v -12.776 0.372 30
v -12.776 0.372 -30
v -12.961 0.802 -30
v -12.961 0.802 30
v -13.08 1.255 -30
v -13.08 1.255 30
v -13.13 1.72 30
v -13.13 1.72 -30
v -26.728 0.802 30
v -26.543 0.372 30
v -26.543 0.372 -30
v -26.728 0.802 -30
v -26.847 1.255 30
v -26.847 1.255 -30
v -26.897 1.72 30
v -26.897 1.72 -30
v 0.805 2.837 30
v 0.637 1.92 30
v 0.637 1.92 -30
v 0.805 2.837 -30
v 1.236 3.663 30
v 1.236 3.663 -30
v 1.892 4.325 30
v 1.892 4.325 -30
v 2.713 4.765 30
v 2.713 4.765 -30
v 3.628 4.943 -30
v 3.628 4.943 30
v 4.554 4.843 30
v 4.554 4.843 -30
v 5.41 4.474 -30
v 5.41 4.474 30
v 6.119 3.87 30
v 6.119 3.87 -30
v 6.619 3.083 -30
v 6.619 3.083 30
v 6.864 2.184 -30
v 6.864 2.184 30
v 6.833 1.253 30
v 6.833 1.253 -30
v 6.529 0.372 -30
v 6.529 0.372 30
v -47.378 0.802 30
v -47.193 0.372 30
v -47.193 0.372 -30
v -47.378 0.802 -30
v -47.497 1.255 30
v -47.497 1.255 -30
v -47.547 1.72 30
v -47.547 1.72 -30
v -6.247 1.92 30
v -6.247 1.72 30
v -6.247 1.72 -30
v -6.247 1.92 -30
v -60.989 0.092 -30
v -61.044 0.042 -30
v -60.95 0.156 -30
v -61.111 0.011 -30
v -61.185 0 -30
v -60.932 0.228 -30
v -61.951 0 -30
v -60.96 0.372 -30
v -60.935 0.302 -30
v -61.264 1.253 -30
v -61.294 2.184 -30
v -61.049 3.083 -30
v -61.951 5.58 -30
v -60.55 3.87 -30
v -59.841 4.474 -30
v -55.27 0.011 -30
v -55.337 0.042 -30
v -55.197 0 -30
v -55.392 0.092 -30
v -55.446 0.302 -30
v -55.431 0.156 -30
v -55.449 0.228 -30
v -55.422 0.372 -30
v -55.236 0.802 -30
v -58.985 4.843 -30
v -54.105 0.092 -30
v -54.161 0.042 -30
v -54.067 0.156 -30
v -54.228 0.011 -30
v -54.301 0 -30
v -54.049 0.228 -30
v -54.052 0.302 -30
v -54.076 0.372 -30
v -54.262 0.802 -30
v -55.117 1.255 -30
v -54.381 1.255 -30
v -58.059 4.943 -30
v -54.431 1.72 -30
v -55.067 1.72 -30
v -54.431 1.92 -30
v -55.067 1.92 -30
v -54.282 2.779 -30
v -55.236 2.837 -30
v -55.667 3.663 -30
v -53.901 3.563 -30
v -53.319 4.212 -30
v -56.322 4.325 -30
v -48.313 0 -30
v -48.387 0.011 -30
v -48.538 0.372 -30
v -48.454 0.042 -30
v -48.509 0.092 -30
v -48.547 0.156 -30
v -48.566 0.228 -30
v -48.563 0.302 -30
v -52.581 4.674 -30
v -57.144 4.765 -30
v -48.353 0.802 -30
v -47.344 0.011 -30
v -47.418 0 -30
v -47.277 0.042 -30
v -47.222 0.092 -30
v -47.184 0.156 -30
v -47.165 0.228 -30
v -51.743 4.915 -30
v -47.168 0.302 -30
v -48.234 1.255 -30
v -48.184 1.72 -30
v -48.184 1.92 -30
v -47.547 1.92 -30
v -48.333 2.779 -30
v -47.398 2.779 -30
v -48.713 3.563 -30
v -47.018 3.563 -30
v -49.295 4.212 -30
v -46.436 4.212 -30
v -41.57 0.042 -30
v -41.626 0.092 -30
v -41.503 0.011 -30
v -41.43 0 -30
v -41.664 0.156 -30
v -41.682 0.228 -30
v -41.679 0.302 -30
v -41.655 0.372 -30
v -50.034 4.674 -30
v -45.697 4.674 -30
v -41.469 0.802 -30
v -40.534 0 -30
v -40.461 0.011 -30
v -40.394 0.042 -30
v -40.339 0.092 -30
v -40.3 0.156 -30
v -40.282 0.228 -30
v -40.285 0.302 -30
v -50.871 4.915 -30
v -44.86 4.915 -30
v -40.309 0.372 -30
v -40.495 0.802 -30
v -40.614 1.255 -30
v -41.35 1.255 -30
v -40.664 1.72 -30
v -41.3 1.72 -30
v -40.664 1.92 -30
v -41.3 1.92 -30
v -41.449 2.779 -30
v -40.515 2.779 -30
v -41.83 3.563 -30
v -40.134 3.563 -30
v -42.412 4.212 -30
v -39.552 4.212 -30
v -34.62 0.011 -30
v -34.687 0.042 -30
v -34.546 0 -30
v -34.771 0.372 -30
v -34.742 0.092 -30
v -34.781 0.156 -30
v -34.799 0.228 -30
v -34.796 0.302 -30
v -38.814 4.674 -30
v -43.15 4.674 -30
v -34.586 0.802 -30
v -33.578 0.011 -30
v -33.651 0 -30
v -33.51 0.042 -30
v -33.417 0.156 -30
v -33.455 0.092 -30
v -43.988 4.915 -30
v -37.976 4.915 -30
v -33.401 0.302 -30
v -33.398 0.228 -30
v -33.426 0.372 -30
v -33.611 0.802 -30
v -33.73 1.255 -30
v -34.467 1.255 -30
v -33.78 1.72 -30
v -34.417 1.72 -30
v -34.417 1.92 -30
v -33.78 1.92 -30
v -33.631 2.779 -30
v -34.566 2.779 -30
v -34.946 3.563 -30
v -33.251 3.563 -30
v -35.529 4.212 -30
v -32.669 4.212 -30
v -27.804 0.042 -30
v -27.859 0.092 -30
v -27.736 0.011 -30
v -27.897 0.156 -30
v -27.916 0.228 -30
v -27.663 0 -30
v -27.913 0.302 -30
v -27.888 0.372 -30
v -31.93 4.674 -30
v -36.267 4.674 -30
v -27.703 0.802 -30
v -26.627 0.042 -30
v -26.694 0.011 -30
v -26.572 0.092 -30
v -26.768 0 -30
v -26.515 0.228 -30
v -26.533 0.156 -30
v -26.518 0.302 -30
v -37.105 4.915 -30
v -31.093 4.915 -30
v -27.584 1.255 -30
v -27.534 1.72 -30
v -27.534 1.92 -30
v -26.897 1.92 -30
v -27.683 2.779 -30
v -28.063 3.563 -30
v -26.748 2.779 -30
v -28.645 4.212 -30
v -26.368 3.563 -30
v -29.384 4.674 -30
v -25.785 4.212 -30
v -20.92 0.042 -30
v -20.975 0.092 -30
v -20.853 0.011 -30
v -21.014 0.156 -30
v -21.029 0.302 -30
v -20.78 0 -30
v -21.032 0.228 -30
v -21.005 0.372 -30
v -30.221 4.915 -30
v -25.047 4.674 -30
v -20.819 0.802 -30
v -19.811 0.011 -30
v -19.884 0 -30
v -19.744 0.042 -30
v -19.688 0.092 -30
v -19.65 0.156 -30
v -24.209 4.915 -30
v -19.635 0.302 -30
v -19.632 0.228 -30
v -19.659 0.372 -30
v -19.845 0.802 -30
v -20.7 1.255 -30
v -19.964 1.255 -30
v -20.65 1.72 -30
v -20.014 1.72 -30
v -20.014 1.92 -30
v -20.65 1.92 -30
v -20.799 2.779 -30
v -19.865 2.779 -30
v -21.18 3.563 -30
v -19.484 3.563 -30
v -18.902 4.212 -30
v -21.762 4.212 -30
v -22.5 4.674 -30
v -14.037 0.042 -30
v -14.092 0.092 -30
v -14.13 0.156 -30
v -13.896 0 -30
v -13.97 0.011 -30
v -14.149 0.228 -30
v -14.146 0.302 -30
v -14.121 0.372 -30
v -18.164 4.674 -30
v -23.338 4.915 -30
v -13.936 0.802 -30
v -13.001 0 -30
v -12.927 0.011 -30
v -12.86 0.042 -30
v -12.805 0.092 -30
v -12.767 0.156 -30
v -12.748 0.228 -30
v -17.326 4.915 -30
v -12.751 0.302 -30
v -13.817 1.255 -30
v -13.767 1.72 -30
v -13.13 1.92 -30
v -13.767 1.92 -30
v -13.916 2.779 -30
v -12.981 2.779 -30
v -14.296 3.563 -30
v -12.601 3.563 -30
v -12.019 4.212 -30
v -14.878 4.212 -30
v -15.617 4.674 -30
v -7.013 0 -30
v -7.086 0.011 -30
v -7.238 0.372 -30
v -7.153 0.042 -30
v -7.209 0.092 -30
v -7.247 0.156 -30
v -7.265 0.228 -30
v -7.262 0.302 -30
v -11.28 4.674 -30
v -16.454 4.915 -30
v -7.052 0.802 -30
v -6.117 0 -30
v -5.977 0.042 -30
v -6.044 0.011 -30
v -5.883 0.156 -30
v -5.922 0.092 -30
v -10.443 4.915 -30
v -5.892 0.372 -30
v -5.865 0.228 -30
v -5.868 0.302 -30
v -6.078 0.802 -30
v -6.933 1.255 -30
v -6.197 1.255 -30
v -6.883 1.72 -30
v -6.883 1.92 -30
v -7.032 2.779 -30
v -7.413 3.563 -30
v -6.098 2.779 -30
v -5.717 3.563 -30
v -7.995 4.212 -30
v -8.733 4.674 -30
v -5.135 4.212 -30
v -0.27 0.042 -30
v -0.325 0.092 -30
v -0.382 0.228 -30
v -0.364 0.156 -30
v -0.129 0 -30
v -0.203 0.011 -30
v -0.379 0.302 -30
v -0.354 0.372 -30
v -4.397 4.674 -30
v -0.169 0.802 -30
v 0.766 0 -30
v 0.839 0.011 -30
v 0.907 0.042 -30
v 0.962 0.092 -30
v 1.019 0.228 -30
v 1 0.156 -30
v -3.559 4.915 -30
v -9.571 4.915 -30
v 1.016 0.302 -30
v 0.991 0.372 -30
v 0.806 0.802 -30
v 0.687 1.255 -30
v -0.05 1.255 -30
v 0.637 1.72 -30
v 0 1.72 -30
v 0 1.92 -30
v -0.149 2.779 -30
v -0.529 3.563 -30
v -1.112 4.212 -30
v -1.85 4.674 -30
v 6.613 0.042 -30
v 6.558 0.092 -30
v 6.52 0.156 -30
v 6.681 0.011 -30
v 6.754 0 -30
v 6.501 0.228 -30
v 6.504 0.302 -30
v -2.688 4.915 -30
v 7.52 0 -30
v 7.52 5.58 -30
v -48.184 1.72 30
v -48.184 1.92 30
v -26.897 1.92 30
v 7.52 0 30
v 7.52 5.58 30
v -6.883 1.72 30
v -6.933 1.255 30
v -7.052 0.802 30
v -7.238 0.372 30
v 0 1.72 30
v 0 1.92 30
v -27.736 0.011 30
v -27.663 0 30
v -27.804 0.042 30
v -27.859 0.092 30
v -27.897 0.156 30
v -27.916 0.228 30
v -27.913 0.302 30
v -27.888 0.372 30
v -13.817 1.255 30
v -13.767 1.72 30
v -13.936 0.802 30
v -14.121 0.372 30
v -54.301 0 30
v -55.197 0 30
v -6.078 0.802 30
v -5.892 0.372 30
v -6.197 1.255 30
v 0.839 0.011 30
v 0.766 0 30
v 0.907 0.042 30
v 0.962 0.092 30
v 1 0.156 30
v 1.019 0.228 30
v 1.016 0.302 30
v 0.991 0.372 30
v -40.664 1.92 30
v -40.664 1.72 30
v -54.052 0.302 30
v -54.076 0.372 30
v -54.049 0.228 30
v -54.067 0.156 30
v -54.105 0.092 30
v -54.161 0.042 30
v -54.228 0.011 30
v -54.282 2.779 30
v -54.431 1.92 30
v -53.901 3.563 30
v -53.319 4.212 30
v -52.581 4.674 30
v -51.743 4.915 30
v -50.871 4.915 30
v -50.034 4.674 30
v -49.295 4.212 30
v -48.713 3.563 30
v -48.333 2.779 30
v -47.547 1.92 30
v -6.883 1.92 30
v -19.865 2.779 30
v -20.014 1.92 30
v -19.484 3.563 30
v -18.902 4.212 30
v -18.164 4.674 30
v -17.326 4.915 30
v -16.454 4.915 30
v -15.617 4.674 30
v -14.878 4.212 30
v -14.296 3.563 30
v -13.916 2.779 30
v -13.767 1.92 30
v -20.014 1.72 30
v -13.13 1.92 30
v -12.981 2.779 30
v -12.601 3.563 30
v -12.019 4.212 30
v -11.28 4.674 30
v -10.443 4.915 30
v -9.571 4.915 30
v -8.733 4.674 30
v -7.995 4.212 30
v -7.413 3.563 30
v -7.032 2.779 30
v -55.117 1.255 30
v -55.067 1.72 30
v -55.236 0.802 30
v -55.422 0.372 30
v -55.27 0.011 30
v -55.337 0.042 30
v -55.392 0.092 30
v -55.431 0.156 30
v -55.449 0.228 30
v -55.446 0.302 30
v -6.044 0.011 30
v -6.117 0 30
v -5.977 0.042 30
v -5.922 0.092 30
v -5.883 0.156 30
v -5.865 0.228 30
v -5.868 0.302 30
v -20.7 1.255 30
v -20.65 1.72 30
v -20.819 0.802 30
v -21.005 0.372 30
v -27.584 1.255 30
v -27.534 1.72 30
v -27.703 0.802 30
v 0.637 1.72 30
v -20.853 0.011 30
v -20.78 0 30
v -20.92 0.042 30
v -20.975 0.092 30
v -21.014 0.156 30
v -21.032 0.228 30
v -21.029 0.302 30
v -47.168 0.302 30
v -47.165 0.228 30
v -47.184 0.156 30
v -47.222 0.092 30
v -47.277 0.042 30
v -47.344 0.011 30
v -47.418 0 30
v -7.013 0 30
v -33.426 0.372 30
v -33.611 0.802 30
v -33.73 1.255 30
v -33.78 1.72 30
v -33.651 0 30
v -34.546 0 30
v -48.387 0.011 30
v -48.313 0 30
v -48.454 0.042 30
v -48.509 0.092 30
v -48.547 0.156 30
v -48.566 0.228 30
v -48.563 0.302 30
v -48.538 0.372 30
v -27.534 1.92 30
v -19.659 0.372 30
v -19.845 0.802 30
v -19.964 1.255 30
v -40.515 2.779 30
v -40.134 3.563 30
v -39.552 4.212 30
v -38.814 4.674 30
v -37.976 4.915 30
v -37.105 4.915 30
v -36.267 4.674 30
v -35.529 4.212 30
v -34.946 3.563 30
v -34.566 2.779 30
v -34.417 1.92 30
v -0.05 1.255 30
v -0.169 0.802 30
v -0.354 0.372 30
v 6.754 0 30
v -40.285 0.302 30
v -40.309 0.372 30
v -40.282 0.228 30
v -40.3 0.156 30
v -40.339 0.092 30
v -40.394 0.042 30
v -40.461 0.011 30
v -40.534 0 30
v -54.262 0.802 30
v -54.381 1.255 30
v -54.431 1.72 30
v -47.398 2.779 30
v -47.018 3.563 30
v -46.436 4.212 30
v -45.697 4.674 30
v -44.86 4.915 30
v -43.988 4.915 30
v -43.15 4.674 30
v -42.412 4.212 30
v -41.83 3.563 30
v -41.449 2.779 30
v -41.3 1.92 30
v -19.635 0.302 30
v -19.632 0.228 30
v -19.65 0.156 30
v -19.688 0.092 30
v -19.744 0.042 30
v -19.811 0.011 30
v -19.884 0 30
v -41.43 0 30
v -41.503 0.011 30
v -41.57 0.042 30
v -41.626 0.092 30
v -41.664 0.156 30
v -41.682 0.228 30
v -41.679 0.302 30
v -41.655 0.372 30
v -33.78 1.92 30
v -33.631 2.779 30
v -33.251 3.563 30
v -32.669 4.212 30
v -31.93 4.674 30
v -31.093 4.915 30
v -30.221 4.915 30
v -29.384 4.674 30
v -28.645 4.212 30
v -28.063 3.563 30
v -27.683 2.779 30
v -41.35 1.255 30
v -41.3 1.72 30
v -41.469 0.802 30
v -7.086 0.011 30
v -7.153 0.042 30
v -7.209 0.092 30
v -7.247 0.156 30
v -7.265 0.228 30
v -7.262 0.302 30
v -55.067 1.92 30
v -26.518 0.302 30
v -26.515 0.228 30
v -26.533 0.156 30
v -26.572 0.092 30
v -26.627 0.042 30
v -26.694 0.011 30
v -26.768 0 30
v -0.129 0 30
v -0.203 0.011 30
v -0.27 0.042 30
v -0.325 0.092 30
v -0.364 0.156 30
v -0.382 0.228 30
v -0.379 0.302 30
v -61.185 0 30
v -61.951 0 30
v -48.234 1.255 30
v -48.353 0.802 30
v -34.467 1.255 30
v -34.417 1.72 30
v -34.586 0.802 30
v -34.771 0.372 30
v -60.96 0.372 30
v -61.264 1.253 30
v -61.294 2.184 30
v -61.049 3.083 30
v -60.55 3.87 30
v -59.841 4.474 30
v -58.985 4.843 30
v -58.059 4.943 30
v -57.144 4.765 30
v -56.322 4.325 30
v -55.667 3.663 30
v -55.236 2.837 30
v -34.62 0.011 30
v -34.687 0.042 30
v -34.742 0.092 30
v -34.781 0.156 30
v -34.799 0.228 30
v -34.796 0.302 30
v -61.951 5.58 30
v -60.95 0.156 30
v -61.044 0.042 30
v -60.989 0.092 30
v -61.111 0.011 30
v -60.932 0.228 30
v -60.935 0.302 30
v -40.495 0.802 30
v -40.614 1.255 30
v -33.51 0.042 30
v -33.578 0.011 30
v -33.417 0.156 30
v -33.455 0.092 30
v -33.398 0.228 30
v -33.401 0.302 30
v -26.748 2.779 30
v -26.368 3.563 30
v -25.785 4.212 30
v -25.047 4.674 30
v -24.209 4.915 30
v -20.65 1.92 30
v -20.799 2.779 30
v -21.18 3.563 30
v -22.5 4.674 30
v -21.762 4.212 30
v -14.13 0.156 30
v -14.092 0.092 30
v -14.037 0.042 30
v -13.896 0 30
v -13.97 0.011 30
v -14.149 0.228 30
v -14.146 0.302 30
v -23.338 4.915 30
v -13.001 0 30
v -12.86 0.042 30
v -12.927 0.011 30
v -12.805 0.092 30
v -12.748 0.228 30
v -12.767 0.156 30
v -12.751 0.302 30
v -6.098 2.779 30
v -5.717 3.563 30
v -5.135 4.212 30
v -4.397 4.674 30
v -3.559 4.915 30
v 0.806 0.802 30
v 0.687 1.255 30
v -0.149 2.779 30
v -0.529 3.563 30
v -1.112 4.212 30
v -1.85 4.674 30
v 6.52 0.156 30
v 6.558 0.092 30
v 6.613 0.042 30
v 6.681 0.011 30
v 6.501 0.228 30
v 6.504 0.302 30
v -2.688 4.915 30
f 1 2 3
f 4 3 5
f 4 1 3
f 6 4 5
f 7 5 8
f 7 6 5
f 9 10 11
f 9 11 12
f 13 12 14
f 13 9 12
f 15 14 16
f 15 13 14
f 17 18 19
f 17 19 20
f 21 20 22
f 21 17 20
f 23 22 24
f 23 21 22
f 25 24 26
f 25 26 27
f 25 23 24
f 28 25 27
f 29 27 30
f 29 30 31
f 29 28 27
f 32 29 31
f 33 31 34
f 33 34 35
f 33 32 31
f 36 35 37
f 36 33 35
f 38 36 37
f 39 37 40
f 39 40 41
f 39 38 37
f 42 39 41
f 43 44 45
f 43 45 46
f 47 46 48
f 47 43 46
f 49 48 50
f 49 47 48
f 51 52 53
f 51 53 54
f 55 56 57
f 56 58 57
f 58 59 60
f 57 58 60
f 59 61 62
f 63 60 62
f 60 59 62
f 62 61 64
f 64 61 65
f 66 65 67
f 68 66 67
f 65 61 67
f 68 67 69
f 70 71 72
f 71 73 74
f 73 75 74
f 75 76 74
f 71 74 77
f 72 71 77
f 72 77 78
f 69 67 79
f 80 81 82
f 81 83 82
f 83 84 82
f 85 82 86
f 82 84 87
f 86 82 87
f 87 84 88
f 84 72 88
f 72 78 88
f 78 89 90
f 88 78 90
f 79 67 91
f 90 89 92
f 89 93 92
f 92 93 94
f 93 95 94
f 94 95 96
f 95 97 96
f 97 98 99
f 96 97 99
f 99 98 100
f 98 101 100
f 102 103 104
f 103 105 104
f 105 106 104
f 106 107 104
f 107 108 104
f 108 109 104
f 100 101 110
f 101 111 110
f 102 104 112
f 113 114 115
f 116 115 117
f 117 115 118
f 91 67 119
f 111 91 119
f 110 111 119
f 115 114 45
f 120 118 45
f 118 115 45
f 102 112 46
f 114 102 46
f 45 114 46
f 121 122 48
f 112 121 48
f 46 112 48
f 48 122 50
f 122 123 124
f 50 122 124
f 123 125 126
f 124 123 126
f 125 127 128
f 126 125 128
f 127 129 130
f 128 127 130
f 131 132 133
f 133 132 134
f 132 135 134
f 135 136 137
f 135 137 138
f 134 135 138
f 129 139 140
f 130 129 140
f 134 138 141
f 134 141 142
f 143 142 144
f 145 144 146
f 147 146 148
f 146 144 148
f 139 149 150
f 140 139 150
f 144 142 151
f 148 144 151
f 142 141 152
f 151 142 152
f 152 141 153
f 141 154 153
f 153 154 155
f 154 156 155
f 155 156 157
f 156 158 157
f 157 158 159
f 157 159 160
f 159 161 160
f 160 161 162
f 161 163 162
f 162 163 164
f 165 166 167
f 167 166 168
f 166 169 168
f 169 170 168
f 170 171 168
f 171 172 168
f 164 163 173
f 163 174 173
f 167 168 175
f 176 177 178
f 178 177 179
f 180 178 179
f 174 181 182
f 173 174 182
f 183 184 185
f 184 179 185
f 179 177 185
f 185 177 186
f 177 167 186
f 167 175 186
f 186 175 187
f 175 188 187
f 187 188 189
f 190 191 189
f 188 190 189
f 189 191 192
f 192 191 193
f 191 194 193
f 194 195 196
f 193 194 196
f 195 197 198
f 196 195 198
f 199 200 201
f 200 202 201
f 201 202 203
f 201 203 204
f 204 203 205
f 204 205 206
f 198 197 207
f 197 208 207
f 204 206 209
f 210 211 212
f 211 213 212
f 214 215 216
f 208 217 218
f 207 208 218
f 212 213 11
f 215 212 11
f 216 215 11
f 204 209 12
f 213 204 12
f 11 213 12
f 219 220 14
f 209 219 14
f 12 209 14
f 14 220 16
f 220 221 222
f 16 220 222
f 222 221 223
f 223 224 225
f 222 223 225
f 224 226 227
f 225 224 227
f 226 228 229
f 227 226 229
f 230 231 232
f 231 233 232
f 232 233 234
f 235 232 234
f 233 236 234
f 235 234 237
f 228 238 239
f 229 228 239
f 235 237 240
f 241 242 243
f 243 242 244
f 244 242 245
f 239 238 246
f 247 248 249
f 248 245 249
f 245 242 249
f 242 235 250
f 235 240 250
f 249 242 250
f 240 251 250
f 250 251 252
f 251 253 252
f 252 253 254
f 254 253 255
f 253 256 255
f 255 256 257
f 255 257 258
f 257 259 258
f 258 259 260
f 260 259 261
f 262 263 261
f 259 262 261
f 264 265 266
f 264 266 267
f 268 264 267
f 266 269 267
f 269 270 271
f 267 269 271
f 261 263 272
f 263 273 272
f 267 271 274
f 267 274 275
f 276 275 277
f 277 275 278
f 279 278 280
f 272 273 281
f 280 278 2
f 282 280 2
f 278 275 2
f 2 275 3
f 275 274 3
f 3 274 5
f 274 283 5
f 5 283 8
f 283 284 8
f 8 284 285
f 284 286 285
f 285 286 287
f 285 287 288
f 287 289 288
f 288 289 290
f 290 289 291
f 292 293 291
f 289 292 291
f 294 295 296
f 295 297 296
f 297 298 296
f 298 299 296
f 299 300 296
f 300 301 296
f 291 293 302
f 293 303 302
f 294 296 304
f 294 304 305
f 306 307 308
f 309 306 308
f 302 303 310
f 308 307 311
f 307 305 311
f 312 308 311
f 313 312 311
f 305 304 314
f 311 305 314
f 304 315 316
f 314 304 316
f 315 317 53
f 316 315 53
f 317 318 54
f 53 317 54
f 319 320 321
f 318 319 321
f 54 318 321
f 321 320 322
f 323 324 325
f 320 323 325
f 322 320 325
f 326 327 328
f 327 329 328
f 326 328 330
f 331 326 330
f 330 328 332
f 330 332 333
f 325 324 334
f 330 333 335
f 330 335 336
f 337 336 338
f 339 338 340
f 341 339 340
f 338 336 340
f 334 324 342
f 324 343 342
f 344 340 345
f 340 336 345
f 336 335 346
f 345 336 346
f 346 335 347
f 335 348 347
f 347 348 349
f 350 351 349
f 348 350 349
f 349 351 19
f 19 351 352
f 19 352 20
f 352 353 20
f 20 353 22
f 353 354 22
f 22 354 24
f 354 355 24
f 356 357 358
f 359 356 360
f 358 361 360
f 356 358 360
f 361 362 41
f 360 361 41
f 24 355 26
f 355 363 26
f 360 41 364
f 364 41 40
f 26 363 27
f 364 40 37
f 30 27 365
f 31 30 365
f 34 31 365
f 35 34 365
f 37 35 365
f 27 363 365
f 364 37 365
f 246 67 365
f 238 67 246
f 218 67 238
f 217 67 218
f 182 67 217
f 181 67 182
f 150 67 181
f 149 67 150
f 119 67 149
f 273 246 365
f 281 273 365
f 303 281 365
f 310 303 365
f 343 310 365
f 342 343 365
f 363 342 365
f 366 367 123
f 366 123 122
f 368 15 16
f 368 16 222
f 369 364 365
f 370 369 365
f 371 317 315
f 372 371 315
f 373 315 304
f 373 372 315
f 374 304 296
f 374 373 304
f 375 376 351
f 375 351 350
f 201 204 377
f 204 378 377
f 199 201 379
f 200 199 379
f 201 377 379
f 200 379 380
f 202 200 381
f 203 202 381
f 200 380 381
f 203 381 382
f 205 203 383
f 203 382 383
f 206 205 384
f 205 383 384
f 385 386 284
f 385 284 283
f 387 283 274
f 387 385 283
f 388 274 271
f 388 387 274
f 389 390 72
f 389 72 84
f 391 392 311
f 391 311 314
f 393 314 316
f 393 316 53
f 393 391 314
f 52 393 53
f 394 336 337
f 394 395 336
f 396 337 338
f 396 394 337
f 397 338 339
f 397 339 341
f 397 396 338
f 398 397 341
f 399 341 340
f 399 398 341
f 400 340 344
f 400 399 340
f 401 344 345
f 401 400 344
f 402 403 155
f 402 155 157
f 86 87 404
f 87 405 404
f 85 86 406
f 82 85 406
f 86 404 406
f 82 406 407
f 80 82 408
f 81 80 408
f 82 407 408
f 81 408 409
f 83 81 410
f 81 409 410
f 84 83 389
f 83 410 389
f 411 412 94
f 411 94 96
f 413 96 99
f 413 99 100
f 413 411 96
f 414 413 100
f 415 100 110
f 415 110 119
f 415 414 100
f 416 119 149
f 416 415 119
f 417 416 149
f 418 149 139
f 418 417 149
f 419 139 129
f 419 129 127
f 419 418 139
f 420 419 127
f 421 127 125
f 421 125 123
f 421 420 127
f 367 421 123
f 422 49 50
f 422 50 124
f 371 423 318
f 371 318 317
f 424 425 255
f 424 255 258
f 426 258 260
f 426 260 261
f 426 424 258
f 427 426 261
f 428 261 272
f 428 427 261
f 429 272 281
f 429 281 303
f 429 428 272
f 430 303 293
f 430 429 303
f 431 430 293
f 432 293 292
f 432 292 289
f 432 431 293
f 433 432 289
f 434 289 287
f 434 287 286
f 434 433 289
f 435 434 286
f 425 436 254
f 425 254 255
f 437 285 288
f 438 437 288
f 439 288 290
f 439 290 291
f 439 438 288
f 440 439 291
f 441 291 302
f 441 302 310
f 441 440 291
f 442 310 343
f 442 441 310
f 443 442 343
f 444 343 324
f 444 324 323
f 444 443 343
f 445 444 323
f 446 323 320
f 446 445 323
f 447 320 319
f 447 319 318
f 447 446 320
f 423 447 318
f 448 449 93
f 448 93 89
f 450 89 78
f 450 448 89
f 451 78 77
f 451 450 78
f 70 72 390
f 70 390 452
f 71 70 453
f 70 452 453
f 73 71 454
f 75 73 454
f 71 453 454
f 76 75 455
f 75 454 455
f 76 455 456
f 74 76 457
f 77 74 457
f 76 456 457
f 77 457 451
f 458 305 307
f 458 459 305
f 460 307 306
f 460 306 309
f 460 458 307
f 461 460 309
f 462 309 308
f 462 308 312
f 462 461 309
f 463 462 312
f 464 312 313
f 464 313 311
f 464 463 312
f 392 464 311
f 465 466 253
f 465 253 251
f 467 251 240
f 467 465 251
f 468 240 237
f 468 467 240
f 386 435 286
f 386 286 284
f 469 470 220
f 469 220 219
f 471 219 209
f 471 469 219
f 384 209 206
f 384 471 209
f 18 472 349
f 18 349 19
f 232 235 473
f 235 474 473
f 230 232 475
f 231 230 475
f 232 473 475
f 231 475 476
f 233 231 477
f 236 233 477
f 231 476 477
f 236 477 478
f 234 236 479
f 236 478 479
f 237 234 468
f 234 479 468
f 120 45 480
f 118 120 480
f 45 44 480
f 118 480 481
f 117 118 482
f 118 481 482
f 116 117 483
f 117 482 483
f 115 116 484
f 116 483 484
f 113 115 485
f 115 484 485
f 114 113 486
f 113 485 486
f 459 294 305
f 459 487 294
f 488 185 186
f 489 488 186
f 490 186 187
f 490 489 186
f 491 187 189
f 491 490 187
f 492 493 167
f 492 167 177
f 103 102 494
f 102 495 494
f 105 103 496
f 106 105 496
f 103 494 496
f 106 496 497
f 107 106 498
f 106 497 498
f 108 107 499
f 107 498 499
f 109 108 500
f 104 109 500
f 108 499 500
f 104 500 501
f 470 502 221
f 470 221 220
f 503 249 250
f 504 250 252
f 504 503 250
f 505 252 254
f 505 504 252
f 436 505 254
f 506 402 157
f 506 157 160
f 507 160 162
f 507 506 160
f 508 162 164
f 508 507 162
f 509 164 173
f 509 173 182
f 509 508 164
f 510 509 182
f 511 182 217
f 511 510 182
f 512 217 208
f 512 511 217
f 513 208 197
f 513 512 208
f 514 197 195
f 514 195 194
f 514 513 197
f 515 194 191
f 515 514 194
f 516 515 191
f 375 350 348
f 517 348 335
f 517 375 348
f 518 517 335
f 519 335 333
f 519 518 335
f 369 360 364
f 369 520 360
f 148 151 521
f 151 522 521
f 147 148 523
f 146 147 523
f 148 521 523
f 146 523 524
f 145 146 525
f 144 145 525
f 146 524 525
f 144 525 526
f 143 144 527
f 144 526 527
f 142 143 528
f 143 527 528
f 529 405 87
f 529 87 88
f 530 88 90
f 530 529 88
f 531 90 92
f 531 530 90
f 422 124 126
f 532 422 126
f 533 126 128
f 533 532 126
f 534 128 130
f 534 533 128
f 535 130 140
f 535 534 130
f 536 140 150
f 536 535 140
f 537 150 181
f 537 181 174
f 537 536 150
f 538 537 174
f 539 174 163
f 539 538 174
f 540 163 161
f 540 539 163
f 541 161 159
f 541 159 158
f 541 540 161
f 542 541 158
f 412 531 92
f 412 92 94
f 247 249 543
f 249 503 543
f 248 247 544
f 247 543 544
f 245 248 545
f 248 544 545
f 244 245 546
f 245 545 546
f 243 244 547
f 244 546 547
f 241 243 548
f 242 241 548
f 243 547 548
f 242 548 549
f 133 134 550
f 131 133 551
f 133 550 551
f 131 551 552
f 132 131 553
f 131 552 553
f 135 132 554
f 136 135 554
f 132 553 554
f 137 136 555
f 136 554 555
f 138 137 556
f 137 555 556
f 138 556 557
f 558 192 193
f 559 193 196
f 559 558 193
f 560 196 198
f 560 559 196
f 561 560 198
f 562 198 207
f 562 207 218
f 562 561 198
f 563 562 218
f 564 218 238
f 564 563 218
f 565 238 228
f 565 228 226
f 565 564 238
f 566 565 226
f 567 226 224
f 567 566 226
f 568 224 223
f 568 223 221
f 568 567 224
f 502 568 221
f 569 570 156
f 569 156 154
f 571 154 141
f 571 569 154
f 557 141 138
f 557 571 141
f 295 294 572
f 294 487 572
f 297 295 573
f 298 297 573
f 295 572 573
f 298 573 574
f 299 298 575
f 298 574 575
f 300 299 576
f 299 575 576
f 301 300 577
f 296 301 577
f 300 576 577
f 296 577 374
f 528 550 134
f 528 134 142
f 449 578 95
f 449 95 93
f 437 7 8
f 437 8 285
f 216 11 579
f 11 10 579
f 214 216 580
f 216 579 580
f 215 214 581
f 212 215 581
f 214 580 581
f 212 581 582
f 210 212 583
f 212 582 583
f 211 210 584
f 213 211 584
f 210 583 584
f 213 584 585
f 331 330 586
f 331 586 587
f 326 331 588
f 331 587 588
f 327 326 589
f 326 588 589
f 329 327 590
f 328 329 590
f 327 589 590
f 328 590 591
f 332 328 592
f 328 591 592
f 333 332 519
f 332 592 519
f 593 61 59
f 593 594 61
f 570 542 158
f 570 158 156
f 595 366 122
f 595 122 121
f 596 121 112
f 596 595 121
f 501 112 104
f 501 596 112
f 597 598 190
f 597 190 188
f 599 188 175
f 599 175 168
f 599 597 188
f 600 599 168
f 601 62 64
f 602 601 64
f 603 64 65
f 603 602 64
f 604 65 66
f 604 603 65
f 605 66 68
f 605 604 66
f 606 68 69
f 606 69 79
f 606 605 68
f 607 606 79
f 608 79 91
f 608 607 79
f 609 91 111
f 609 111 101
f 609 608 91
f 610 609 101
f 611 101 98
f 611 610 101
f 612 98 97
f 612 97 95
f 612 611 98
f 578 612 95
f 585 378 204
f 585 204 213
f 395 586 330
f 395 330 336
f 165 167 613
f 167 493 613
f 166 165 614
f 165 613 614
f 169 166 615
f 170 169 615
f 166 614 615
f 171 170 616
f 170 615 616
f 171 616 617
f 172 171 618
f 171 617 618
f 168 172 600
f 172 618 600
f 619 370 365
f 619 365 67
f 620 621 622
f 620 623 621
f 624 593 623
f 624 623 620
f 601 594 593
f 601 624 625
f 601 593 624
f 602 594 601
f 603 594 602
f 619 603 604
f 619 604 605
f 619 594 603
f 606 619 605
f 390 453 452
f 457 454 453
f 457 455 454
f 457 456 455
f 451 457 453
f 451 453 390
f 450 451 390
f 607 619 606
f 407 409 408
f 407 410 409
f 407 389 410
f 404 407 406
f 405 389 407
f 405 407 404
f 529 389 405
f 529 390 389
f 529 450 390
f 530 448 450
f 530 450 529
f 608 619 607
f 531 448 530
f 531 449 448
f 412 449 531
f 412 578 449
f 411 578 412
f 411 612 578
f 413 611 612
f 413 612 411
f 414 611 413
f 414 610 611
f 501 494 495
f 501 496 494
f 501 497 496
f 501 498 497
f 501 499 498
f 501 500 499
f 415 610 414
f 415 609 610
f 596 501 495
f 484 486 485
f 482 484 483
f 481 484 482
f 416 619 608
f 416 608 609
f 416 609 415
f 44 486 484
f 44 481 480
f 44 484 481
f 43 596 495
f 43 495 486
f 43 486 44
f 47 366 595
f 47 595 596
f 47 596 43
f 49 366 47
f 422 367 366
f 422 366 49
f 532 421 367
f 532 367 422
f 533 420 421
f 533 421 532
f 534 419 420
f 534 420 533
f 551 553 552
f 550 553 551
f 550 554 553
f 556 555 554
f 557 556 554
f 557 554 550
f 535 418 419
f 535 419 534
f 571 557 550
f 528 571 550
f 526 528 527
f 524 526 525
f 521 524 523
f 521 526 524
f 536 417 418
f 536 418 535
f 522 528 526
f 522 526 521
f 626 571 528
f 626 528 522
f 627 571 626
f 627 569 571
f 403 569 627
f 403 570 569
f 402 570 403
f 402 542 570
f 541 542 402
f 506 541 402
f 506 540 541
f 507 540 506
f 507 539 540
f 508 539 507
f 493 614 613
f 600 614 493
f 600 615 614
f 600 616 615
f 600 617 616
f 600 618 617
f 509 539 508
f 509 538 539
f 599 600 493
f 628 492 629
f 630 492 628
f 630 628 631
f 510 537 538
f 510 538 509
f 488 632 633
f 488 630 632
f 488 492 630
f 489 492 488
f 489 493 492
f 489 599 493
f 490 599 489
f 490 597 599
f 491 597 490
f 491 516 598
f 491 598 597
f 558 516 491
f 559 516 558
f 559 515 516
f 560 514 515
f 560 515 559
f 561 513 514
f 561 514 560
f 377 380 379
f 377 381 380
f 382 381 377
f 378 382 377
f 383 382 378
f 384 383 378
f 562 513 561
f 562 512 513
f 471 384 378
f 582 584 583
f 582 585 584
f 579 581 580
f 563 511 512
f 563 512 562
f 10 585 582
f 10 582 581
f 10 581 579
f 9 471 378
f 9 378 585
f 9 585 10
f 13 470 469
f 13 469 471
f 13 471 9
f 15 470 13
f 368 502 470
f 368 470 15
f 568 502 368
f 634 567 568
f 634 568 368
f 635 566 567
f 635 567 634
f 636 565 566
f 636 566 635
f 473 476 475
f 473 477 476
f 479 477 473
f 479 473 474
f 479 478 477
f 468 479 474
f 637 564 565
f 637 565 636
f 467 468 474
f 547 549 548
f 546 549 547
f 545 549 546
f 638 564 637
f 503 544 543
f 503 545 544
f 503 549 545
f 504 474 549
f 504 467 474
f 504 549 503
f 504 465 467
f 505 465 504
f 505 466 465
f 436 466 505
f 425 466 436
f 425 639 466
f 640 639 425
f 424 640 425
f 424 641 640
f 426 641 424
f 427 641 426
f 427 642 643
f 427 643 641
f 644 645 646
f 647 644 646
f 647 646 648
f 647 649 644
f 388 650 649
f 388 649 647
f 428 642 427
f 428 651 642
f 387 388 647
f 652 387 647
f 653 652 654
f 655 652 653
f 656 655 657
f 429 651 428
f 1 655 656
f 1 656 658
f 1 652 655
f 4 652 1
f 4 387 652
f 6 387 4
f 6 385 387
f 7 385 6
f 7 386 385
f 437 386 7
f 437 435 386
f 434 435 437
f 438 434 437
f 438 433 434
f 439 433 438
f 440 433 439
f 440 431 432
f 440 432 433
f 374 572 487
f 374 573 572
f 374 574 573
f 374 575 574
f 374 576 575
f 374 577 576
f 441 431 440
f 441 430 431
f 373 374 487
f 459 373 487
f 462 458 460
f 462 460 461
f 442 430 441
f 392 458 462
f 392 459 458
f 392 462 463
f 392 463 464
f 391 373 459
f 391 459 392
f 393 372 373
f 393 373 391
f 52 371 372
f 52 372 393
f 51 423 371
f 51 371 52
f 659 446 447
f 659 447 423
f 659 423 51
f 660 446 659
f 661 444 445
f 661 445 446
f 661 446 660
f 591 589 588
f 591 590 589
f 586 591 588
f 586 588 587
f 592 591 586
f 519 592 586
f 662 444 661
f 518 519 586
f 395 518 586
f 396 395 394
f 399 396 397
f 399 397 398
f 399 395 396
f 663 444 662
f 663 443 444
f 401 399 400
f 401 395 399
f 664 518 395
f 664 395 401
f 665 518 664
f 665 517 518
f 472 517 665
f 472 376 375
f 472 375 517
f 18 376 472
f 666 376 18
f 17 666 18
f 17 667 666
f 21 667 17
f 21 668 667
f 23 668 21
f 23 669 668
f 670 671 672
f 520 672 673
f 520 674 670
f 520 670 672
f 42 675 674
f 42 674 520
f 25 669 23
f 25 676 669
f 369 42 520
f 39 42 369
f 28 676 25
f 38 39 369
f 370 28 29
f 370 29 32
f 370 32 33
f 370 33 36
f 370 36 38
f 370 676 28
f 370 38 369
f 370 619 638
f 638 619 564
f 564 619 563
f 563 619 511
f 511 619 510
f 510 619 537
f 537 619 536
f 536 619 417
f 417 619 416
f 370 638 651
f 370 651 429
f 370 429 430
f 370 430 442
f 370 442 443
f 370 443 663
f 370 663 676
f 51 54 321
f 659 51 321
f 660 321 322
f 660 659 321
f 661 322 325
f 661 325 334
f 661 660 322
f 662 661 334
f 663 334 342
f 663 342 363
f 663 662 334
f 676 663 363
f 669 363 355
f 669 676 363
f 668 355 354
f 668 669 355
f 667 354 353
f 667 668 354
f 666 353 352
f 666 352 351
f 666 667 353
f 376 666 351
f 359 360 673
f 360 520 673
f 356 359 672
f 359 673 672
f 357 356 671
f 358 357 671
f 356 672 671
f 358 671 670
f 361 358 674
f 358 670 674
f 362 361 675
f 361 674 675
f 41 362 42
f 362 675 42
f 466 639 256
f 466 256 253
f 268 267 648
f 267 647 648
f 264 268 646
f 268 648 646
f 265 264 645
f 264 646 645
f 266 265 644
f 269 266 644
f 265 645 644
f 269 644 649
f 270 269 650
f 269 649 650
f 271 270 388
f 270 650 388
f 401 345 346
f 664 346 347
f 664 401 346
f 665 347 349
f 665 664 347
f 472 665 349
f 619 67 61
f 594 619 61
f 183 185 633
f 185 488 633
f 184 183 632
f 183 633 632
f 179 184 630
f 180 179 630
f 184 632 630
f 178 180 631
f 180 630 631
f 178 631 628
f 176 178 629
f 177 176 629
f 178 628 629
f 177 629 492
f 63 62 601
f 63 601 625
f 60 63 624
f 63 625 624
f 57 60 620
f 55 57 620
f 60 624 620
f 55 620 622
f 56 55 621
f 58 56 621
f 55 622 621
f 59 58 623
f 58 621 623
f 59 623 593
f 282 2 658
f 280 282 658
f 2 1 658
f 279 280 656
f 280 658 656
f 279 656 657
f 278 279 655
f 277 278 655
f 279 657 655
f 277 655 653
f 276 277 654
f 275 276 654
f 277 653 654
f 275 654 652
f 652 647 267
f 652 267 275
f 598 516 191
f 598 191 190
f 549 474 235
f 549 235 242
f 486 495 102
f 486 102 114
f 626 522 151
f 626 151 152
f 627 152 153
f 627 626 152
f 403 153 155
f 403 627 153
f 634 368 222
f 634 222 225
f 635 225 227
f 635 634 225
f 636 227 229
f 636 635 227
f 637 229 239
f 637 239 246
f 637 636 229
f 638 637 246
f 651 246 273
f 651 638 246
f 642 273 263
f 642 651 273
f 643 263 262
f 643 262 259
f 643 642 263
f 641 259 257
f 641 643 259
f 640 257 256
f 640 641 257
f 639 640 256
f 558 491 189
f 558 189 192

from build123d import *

# Parameters (mm, degrees)
BOSS_EXTRUDE1_DEPTH    = 30
FILLET1_R              = 0.254
LPATTERN1_COUNT        = 10
LPATTERN1_PITCH        = 6.8834
FILLET1_OF_LPATTERN1_R = 0.254


with BuildPart() as part:
    # Sketch1 → Boss-Extrude1 (new, symmetric)
    with BuildSketch(Plane.XY):
        with BuildLine():
            Line((0, 0), (1.22, 0))
            ThreePointArc((1.22, 0), (3.76, 4.945446374), (6.3, 0))
            Line((6.3, 0), (7.52, 0))
            Line((7.52, 0), (7.52, 5.580446374))
            Line((7.52, 5.580446374), (0, 5.580446374))
            Line((0, 5.580446374), (0, 0))
        make_face()
    boss_extrude1 = extrude(amount=BOSS_EXTRUDE1_DEPTH, both=True)

    # Fillet1
    fillet1_edges = [part.edges().sort_by_distance(p)[0] for p in [
        (6.3, 0, 0),
        (1.22, 0, 0),
    ]]
    fillet(fillet1_edges, radius=FILLET1_R)

    # LPattern1: Boss-Extrude1 ×10
    with Locations(*[(-i * LPATTERN1_PITCH, 0, 0) for i in range(1, LPATTERN1_COUNT)]):
        add(boss_extrude1)

    # Fillet1 of LPattern1
    fillet1_of_lpattern1_edges = [part.edges().sort_by_distance(p)[0] for p in [
        (-0.5834, 0, 0),
        (-5.6634, 0, 0),
        (-7.4668, 0, 0),
        (-12.5468, 0, 0),
        (-14.3502, 0, 0),
        (-19.4302, 0, 0),
        (-21.2336, 0, 0),
        (-26.3136, 0, 0),
        (-28.117, 0, 0),
        (-33.197, 0, 0),
        (-35.0004, 0, 0),
        (-40.0804, 0, 0),
        (-41.8838, 0, 0),
        (-46.9638, 0, 0),
        (-48.7672, 0, 0),
        (-53.8472, 0, 0),
        (-55.6506, 0, 0),
        (-60.7306, 0, 0),
    ]]
    fillet(fillet1_of_lpattern1_edges, radius=FILLET1_OF_LPATTERN1_R)


solid = part.part
